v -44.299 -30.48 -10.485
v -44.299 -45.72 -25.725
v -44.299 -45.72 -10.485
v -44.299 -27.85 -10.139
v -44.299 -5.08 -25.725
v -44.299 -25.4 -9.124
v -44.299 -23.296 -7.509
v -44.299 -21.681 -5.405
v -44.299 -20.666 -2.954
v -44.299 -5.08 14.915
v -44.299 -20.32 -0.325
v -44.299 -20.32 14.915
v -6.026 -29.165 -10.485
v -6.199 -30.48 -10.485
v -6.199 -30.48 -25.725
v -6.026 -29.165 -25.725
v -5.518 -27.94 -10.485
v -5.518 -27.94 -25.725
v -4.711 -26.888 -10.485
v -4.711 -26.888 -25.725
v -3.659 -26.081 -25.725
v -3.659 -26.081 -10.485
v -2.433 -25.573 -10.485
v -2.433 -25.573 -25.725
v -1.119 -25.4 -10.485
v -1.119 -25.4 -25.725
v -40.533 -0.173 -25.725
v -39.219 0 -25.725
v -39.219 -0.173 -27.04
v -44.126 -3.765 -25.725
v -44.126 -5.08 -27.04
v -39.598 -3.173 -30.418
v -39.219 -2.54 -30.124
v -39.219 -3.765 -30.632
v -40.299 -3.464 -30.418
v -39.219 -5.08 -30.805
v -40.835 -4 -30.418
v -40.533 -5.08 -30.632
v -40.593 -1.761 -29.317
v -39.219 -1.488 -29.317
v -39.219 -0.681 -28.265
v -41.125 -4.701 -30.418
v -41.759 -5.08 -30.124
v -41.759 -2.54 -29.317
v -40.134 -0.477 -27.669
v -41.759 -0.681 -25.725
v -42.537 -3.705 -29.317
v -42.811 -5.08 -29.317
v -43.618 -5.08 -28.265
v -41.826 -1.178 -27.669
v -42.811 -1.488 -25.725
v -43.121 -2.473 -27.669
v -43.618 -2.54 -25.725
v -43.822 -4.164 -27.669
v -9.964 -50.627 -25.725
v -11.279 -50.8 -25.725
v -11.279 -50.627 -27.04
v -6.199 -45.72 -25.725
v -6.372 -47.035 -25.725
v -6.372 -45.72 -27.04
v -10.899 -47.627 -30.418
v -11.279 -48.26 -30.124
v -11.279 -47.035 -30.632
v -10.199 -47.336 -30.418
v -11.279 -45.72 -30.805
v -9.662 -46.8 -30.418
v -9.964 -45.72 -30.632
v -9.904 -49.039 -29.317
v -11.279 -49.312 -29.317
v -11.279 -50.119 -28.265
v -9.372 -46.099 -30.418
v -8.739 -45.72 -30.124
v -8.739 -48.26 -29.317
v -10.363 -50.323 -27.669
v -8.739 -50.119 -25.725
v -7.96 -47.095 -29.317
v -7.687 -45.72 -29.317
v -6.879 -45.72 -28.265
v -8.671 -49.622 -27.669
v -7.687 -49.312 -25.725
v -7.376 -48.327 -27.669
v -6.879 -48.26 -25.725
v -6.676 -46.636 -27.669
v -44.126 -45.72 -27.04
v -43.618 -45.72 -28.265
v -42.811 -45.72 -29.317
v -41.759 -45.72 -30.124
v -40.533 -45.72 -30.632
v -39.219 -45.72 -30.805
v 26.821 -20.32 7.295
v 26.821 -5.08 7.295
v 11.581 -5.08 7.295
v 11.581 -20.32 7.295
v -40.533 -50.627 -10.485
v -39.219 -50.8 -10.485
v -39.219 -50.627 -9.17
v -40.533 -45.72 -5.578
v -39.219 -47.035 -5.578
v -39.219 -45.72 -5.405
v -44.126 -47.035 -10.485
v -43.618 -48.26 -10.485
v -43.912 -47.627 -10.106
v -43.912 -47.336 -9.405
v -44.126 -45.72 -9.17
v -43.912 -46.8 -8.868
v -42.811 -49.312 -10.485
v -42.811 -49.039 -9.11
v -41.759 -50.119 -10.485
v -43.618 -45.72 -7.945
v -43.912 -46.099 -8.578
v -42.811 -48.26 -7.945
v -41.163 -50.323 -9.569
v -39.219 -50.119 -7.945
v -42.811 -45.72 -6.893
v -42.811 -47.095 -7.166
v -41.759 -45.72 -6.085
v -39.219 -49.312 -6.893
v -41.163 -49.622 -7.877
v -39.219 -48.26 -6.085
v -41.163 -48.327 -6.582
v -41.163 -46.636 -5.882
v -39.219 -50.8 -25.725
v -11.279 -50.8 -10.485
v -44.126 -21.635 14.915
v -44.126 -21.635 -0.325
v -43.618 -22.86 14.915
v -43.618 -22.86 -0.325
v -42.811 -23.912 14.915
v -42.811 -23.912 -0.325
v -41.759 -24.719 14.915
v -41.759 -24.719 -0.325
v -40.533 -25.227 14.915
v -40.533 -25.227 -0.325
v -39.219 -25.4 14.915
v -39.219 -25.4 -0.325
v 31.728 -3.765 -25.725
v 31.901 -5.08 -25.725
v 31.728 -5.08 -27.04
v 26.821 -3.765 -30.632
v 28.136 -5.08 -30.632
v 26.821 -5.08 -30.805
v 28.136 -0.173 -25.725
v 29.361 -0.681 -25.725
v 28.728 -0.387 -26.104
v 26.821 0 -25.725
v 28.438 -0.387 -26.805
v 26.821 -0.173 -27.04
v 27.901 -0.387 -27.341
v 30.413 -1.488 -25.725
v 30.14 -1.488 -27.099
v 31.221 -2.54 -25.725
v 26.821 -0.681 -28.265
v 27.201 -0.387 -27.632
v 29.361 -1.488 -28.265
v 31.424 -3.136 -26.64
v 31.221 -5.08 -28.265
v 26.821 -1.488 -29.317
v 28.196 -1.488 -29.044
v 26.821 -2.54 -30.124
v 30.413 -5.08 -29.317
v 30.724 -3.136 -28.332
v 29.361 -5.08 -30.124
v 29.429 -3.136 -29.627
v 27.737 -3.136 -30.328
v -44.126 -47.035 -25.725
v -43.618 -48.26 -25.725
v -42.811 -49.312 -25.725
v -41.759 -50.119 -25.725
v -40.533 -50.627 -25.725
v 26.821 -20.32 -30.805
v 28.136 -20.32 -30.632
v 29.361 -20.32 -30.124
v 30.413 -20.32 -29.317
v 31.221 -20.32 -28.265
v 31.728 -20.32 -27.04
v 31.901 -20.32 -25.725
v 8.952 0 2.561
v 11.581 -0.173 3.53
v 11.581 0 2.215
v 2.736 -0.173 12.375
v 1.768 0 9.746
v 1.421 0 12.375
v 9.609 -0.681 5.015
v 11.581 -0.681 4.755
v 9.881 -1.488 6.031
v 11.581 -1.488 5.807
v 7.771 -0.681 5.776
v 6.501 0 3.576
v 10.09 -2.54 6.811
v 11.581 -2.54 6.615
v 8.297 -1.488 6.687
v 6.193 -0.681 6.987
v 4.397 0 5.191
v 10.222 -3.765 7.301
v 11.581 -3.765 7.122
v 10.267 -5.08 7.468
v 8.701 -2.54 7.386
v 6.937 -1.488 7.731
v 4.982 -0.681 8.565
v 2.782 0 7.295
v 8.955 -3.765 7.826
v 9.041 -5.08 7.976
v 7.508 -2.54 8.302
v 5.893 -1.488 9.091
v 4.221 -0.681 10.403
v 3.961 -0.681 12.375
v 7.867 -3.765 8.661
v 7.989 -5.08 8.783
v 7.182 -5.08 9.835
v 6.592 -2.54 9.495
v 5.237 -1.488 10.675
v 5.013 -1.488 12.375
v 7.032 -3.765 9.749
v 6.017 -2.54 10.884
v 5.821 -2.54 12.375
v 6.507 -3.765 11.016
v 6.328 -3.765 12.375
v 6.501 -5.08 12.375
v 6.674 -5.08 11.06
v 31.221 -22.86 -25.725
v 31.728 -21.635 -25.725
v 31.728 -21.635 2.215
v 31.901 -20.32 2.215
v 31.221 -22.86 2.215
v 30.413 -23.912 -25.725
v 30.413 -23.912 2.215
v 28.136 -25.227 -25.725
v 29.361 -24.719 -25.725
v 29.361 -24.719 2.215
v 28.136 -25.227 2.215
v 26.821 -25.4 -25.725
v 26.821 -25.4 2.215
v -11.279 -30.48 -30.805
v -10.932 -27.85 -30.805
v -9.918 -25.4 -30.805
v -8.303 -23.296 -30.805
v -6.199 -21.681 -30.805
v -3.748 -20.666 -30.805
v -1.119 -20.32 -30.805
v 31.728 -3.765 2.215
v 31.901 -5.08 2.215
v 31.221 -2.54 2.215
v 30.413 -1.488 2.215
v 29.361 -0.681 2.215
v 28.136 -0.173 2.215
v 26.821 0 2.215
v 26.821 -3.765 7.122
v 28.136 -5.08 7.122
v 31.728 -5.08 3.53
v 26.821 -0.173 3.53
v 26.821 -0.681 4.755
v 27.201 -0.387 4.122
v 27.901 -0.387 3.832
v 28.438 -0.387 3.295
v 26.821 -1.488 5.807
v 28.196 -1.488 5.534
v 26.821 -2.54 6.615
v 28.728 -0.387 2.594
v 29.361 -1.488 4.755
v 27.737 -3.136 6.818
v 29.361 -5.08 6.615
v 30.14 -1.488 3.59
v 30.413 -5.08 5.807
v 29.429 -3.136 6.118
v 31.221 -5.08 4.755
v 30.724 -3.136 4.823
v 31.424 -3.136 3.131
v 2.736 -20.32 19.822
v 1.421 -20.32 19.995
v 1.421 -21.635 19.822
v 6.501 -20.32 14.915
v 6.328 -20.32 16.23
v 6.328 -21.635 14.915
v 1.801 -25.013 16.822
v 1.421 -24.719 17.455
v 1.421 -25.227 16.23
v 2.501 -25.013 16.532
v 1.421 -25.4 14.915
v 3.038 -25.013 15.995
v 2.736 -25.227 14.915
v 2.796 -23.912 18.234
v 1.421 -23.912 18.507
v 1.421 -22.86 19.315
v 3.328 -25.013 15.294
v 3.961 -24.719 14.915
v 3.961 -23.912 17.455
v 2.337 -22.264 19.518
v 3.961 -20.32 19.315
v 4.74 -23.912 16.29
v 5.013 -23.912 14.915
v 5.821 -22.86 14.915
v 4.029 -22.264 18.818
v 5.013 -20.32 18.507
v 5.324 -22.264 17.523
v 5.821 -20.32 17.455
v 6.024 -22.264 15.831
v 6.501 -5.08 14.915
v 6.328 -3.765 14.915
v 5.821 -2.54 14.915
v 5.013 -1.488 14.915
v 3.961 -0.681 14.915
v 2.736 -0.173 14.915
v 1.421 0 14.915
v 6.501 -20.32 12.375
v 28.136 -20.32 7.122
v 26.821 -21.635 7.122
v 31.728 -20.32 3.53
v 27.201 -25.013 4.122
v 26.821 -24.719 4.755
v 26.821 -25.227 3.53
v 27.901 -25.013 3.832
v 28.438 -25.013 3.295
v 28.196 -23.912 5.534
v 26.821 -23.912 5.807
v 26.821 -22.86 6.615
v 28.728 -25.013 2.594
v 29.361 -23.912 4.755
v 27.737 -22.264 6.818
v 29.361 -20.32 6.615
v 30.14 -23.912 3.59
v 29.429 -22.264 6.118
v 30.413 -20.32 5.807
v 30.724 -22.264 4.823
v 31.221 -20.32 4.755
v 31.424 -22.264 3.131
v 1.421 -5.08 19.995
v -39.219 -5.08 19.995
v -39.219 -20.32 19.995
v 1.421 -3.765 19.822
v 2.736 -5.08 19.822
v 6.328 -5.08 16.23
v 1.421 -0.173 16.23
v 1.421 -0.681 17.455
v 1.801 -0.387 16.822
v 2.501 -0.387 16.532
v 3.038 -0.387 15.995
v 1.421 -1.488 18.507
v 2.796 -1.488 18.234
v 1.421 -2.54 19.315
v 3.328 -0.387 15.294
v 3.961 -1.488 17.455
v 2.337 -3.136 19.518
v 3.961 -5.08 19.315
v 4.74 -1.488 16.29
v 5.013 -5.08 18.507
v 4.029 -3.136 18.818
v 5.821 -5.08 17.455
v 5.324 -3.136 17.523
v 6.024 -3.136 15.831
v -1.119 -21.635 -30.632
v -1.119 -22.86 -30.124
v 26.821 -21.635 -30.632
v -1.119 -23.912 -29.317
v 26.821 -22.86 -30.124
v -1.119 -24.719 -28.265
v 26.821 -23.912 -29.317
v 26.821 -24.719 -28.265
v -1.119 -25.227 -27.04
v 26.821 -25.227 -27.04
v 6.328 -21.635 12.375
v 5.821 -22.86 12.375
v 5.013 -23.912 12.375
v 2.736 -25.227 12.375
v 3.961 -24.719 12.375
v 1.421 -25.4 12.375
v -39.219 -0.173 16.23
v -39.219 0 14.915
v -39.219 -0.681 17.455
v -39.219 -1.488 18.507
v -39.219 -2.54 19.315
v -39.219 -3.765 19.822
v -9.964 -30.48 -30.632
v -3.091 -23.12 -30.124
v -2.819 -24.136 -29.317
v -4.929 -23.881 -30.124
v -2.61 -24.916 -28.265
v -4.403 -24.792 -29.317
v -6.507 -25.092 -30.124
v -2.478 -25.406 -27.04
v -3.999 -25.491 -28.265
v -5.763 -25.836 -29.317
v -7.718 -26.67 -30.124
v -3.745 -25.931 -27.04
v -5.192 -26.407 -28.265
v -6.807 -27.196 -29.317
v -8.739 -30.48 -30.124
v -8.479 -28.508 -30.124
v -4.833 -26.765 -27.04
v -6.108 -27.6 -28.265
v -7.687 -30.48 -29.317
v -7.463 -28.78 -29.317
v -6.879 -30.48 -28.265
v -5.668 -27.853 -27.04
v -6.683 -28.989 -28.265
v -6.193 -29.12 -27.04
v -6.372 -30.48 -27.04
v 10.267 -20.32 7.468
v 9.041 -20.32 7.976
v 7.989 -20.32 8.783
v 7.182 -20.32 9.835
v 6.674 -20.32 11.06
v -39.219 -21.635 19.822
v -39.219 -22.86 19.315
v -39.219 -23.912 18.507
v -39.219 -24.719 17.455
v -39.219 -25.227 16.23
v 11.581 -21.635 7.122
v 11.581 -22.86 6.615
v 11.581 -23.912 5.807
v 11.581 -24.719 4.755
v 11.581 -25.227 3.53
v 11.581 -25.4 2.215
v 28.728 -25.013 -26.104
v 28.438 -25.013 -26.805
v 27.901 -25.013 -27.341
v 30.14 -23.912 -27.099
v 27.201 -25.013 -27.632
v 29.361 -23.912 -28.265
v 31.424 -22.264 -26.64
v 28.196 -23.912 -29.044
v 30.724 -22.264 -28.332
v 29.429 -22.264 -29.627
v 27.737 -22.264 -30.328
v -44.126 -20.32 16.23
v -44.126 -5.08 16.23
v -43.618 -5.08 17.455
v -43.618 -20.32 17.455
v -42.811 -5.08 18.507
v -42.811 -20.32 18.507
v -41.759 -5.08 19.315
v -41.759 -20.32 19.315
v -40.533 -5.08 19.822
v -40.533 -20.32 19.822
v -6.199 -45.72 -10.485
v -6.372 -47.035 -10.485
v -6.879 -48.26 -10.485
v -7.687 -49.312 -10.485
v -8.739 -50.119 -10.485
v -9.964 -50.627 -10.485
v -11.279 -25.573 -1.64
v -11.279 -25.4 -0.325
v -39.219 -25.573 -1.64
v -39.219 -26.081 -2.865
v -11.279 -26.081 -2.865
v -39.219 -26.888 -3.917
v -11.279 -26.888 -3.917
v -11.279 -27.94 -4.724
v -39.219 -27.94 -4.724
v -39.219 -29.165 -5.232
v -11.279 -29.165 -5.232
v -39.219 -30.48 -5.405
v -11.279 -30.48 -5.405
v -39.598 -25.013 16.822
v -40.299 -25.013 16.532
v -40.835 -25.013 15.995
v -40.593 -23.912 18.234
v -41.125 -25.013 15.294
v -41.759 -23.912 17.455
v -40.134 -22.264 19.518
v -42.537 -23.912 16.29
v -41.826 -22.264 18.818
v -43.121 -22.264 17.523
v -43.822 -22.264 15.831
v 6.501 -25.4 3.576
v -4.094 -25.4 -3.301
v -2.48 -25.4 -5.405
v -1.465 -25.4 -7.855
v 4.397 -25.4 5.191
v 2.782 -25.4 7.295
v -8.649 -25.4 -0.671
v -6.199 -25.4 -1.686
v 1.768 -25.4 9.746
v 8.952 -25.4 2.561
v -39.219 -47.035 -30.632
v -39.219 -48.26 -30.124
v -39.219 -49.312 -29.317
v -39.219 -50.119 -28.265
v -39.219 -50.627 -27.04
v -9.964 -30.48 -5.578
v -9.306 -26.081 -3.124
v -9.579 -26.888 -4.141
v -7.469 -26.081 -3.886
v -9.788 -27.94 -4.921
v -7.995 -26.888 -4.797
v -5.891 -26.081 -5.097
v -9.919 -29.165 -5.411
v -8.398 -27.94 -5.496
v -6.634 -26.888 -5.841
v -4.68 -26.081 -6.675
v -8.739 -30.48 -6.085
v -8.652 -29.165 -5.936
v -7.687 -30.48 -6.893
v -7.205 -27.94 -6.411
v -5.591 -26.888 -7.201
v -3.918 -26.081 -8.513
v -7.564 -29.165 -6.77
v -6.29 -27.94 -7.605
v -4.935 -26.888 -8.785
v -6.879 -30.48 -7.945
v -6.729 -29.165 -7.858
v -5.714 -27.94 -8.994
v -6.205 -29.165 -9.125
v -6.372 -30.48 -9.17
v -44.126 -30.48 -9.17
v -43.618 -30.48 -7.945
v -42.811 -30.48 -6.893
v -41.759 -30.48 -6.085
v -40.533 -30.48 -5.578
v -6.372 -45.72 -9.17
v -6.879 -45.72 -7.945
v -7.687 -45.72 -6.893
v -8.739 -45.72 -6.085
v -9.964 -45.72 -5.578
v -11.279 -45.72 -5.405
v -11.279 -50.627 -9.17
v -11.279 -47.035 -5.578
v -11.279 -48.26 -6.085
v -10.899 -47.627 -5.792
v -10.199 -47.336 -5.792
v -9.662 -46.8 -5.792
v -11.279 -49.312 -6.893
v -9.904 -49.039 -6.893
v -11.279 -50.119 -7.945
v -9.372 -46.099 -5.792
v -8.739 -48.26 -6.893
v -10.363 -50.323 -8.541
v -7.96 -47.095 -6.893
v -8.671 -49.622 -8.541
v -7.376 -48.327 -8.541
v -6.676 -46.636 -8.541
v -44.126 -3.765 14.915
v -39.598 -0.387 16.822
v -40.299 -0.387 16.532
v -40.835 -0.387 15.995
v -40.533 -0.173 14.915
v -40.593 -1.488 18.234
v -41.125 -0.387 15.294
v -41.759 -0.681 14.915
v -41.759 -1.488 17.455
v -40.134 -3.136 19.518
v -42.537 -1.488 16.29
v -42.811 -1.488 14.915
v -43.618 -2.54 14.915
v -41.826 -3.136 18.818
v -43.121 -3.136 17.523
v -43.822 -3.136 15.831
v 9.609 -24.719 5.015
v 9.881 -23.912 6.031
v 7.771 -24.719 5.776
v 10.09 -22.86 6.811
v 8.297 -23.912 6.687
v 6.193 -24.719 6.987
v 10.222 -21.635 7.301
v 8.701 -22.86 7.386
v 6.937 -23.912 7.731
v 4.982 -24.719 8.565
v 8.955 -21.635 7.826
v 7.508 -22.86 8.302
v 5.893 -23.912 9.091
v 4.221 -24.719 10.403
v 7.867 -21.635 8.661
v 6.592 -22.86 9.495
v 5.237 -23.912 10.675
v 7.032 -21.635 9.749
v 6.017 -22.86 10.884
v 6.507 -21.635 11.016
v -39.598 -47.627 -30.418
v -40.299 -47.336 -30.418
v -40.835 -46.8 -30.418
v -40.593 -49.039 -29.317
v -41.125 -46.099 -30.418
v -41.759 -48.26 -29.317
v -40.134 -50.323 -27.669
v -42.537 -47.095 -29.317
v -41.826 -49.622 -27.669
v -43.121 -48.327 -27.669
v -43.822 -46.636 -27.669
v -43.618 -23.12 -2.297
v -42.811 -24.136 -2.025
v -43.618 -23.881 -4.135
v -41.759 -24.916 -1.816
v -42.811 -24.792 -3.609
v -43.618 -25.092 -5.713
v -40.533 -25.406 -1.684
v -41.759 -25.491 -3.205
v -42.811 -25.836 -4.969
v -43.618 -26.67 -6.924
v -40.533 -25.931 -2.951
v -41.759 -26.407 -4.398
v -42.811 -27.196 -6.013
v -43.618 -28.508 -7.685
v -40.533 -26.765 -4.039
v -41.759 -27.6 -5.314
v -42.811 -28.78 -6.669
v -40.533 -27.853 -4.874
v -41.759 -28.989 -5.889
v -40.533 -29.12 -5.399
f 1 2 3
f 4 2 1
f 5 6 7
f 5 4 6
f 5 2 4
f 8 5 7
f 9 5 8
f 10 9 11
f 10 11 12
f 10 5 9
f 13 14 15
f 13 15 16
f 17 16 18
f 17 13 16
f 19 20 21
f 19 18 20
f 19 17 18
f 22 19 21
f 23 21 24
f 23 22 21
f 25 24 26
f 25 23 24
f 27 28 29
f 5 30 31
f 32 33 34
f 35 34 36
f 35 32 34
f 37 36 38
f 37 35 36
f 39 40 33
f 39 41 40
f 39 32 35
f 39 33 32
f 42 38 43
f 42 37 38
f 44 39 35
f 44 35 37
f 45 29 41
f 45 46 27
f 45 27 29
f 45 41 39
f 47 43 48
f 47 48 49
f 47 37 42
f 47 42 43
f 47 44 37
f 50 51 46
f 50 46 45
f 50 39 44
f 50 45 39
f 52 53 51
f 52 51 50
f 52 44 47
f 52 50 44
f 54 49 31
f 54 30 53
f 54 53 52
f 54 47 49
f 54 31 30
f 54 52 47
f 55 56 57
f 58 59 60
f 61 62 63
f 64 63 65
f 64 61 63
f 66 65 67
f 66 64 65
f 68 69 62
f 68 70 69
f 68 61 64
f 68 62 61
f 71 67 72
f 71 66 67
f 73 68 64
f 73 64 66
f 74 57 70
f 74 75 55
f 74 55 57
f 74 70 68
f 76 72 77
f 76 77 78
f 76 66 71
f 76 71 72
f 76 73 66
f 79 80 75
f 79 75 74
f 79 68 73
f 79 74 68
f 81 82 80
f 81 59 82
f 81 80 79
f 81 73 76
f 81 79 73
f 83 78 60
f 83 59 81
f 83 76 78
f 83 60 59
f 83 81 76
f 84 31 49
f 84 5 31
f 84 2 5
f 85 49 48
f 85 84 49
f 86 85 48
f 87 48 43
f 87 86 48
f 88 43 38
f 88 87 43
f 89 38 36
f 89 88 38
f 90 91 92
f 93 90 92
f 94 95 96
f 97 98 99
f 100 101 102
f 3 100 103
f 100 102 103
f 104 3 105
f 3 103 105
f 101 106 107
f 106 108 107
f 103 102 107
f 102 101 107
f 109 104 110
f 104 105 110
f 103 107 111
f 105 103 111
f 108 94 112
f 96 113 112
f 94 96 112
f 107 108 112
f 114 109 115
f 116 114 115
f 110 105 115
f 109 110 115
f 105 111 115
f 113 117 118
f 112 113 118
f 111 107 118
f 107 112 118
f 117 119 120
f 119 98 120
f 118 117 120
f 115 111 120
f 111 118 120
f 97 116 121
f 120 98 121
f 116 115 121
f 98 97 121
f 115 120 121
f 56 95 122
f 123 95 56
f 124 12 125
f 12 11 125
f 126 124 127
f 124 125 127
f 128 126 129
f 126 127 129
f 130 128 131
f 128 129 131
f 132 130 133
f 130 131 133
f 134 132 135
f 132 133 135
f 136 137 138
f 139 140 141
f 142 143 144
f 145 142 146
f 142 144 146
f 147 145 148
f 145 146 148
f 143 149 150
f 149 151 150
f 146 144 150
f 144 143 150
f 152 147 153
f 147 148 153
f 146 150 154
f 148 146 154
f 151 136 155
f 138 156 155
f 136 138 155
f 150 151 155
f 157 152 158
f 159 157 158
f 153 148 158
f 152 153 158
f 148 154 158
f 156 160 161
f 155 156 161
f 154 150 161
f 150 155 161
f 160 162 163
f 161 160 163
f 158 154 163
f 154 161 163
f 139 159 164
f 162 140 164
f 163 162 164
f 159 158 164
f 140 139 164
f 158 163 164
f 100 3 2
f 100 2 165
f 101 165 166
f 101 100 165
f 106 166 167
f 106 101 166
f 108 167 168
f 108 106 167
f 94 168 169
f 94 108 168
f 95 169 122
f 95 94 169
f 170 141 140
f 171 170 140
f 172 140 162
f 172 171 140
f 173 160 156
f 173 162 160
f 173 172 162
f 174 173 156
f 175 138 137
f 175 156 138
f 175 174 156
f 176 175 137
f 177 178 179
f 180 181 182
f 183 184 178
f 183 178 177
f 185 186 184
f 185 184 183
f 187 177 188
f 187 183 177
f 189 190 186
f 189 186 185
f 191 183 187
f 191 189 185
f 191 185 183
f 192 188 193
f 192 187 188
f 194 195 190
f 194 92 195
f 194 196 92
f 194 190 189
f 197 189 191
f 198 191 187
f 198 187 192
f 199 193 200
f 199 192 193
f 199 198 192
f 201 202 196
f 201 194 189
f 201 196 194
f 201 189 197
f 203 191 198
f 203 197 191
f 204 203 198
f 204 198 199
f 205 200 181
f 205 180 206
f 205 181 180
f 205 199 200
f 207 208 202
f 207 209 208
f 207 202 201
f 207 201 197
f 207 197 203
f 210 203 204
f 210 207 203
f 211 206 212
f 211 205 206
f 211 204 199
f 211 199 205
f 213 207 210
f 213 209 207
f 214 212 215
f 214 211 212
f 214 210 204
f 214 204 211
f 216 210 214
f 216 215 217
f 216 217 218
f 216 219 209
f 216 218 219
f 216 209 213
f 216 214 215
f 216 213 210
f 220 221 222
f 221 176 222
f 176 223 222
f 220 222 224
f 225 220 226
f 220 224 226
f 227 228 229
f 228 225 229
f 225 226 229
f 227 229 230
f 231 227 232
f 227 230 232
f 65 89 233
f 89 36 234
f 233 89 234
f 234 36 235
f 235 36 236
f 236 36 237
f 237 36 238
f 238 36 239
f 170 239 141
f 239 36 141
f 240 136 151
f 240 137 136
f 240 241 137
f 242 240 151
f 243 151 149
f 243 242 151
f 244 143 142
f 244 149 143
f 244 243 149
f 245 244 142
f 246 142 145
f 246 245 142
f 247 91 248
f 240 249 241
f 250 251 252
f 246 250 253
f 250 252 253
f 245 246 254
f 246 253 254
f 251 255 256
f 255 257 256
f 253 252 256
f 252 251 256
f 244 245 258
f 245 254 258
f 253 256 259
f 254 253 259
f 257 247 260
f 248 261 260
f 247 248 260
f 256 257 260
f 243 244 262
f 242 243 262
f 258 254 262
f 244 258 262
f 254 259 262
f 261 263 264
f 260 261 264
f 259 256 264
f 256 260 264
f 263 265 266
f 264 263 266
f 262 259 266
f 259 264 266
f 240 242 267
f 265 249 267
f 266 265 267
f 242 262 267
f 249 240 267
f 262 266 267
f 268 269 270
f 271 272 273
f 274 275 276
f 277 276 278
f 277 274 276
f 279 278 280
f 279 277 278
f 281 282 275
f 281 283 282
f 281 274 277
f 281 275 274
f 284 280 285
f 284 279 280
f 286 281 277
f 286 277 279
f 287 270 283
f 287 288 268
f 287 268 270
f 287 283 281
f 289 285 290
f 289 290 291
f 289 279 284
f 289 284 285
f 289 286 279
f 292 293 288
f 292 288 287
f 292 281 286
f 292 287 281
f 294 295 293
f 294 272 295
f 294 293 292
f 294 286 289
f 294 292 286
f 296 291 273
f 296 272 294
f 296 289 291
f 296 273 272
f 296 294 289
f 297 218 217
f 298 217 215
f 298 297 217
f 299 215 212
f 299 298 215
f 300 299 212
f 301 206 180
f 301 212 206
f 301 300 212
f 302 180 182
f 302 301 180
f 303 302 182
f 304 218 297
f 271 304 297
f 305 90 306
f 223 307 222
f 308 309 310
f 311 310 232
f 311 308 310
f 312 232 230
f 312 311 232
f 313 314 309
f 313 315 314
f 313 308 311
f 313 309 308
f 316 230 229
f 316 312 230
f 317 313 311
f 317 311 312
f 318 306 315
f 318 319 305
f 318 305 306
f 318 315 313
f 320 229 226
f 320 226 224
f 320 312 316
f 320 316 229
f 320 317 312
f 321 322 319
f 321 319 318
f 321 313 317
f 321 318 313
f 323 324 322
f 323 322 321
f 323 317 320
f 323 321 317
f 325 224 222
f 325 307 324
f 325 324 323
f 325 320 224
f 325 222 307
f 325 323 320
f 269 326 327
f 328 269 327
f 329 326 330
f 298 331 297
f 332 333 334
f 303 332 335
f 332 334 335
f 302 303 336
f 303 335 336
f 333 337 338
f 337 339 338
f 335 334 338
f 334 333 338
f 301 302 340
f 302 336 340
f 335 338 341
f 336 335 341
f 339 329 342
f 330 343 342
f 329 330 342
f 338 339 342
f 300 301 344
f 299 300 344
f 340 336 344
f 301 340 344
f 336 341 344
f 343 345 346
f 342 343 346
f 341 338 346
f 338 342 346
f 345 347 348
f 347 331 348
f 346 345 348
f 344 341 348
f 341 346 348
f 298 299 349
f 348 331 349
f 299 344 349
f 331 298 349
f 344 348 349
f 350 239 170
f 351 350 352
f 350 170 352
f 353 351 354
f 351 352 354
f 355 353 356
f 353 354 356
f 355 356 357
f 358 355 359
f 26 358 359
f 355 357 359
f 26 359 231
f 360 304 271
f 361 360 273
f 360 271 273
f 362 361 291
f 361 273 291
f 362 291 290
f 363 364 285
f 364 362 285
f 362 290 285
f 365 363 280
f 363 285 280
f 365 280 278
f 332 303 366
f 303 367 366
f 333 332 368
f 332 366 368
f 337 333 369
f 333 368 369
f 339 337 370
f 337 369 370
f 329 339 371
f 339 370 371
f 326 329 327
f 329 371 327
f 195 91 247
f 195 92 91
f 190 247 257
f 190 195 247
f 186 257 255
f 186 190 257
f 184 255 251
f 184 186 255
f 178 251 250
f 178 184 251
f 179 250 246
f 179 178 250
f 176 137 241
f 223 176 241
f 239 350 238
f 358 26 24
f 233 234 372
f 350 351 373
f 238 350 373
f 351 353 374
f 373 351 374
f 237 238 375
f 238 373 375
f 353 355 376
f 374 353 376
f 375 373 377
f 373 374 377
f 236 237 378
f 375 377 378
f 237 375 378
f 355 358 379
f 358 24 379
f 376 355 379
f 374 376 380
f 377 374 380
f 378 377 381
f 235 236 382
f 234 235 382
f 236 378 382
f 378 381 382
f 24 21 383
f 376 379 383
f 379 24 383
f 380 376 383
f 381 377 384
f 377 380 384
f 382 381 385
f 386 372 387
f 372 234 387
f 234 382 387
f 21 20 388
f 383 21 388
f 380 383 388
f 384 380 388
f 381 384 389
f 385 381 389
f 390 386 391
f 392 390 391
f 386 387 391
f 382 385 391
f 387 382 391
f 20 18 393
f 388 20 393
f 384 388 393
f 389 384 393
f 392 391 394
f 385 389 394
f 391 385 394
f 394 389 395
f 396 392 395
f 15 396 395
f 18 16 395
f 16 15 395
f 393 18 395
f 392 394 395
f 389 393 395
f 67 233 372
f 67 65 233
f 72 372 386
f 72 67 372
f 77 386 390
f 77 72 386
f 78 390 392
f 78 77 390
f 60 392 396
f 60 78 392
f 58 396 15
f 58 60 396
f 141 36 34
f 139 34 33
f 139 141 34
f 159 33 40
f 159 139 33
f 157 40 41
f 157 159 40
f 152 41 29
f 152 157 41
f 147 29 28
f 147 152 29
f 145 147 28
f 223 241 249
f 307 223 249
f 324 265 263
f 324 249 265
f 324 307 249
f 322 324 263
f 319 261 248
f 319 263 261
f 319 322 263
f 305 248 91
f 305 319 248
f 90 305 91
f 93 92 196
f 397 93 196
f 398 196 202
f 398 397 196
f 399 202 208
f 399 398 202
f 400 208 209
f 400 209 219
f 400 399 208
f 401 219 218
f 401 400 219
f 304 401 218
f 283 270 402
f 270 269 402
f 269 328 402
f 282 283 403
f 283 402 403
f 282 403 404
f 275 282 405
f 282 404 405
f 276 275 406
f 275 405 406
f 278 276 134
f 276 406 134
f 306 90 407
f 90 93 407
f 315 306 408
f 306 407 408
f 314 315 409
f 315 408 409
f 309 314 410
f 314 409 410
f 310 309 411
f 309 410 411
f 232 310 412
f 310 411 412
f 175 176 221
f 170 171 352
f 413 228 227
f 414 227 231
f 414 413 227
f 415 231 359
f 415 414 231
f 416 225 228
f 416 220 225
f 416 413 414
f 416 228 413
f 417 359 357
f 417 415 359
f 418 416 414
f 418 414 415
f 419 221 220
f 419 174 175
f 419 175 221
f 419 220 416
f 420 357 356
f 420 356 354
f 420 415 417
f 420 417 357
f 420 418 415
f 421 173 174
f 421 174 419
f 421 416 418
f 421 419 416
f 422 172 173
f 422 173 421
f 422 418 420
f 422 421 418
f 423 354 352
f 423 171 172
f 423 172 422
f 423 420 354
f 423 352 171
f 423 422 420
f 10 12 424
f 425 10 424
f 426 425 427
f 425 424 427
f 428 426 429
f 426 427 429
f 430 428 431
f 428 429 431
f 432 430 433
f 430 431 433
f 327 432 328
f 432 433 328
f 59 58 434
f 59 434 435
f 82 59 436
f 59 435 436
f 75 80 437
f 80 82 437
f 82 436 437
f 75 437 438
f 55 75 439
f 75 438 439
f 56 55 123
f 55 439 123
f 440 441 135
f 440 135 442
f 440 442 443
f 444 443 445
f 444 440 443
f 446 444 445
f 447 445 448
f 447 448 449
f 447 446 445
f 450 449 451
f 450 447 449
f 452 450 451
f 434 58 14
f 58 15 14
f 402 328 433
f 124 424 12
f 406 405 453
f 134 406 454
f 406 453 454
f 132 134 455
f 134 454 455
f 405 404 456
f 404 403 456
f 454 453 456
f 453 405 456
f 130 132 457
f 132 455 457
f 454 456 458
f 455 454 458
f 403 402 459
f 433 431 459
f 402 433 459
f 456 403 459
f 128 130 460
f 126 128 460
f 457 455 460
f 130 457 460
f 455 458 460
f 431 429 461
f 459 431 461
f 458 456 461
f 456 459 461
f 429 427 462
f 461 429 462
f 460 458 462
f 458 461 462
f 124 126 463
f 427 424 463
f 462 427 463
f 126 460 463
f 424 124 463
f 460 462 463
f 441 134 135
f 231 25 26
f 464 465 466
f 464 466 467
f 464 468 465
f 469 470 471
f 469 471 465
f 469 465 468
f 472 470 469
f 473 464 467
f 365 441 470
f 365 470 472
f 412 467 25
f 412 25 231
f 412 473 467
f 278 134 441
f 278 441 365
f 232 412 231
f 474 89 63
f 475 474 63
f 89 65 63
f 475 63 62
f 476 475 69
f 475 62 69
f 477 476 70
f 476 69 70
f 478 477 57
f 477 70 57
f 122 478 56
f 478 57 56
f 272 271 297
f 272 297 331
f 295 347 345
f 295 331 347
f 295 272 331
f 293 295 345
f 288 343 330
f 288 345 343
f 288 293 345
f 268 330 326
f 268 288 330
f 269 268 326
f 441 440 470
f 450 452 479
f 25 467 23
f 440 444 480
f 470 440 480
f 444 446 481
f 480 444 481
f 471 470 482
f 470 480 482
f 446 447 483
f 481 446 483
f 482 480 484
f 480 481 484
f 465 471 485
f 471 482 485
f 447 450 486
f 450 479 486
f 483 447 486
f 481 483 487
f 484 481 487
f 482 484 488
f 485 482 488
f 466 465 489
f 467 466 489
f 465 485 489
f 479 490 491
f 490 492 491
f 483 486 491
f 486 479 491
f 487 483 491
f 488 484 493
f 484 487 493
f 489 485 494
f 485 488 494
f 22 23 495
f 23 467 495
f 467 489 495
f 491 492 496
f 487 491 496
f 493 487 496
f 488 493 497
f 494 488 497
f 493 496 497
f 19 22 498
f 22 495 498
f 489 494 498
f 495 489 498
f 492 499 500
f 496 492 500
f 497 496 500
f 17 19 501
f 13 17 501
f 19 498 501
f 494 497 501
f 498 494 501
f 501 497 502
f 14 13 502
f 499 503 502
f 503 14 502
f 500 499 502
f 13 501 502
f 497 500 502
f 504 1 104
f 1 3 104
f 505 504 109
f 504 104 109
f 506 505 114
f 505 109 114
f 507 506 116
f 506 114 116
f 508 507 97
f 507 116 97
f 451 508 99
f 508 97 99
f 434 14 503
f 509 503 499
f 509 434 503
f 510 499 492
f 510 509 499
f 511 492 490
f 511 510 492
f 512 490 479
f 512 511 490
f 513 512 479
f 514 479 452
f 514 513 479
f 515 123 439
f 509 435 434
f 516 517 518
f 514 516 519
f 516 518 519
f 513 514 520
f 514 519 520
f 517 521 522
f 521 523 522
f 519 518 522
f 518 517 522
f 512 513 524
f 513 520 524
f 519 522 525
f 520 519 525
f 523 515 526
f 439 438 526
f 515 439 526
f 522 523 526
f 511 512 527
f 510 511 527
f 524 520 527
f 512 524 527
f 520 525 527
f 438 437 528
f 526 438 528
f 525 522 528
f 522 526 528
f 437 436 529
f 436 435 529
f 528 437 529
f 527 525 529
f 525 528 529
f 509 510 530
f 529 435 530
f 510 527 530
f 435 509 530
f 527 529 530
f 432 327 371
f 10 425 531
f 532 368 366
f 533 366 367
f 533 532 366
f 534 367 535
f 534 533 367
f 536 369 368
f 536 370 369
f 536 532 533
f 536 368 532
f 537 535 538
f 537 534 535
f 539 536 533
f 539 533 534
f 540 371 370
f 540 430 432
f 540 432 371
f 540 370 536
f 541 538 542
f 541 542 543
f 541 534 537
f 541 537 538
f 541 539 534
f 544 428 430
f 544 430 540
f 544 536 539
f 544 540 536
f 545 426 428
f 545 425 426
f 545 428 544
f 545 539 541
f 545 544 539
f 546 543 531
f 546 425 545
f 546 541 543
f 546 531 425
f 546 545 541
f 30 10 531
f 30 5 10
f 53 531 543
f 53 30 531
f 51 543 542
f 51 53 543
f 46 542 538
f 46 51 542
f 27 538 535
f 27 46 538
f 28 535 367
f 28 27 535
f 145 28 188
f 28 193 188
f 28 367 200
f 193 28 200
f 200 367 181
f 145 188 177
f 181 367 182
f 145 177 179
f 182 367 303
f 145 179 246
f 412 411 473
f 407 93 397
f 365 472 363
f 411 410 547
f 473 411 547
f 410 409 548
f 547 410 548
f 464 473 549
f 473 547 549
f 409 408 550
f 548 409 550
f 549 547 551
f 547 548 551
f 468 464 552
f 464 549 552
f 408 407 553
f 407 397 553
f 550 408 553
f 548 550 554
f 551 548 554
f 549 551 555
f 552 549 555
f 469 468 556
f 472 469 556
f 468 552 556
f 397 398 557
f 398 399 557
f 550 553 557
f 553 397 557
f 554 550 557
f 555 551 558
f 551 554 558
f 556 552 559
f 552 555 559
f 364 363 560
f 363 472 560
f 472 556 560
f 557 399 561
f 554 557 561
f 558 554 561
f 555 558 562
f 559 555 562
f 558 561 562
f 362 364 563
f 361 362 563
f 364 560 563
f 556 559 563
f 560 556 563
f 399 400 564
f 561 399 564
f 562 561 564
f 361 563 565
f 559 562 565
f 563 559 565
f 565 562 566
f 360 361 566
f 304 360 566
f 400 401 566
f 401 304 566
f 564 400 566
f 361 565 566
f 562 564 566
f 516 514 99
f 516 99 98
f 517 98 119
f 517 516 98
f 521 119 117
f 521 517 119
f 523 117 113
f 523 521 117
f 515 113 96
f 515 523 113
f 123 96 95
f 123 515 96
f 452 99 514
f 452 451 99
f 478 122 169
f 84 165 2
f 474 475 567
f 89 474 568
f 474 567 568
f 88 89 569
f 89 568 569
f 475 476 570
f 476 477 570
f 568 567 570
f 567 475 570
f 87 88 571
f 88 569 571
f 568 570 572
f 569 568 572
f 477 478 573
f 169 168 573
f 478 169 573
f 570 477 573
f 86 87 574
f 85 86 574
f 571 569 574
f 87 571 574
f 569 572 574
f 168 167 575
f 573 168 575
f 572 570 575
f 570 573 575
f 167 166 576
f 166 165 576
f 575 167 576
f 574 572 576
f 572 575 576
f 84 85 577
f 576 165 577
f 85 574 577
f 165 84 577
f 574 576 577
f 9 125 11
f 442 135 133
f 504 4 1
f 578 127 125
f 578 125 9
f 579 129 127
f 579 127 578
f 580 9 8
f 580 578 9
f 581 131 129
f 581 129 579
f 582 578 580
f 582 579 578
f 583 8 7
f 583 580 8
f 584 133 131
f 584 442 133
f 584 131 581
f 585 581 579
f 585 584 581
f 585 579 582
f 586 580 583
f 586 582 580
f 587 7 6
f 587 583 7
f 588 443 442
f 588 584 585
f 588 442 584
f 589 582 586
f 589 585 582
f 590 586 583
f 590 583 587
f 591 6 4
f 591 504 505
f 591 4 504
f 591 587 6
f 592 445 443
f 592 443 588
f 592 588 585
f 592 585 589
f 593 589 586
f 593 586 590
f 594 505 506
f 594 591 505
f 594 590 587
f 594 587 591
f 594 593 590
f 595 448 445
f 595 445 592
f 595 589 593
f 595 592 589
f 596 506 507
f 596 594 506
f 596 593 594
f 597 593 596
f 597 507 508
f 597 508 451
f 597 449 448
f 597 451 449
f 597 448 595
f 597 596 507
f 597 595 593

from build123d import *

# Parameters (mm, degrees)
F1_DEPTH = 25.4
F2_W     = 38.1
F2_H     = 25.4
F3_DEPTH = 25.4
F4_R     = 5.08


with BuildPart() as f1:
    # F0 (on Front) → F1 (new body)
    with BuildSketch(Plane.XZ):
        Polygon((6.5013106585, 19.9951574836), (-44.2986893415, 19.9951574836), (-44.2986893415, -30.8048425164), (31.9013106585, -30.8048425164), (31.9013106585, 7.2951574836), (6.5013106585, 7.2951574836), align=None)
    extrude(amount=F1_DEPTH)

    # F2 (on face) → F3 (join)
    with BuildSketch(Plane.XZ.offset(25.4)):
        with Locations((-25.2486893415, -18.1048425164)):
            Rectangle(F2_W, F2_H)
    extrude(amount=F3_DEPTH)

    # F4
    f4_edges = [f1.edges().sort_by_distance(p)[0] for p in [
        (6.501311, -12.7, 19.995157),
        (-44.298689, -12.7, 19.995157),
        (-18.898689, 0, 19.995157),
        (-18.898689, -25.4, 19.995157),
        (31.901311, -12.7, 7.295157),
        (6.501311, -12.7, 7.295157),
        (19.201311, 0, 7.295157),
        (19.201311, -25.4, 7.295157),
        (-6.198689, -50.8, -18.104843),
        (-25.248689, -50.8, -5.404843),
        (-44.298689, -50.8, -18.104843),
        (-25.248689, -50.8, -30.804843),
        (-6.198689, -38.1, -5.404843),
        (-44.298689, -38.1, -5.404843),
        (-25.248689, -25.4, -5.404843),
        (-6.198689, -38.1, -30.804843),
        (-6.198689, -25.4, -18.104843),
        (31.901311, -12.7, -30.804843),
        (31.901311, 0, -11.754843),
        (31.901311, -25.4, -11.754843),
        (12.851311, -25.4, -30.804843),
        (-44.298689, -25.4, 7.295157),
        (6.501311, -25.4, 13.645157),
        (6.501311, 0, 13.645157),
        (-44.298689, 0, -5.404843),
        (-6.198689, 0, -30.804843),
        (-44.298689, -25.4, -30.804843),
    ]]
    fillet(f4_edges, radius=F4_R)


solid = f1.part
